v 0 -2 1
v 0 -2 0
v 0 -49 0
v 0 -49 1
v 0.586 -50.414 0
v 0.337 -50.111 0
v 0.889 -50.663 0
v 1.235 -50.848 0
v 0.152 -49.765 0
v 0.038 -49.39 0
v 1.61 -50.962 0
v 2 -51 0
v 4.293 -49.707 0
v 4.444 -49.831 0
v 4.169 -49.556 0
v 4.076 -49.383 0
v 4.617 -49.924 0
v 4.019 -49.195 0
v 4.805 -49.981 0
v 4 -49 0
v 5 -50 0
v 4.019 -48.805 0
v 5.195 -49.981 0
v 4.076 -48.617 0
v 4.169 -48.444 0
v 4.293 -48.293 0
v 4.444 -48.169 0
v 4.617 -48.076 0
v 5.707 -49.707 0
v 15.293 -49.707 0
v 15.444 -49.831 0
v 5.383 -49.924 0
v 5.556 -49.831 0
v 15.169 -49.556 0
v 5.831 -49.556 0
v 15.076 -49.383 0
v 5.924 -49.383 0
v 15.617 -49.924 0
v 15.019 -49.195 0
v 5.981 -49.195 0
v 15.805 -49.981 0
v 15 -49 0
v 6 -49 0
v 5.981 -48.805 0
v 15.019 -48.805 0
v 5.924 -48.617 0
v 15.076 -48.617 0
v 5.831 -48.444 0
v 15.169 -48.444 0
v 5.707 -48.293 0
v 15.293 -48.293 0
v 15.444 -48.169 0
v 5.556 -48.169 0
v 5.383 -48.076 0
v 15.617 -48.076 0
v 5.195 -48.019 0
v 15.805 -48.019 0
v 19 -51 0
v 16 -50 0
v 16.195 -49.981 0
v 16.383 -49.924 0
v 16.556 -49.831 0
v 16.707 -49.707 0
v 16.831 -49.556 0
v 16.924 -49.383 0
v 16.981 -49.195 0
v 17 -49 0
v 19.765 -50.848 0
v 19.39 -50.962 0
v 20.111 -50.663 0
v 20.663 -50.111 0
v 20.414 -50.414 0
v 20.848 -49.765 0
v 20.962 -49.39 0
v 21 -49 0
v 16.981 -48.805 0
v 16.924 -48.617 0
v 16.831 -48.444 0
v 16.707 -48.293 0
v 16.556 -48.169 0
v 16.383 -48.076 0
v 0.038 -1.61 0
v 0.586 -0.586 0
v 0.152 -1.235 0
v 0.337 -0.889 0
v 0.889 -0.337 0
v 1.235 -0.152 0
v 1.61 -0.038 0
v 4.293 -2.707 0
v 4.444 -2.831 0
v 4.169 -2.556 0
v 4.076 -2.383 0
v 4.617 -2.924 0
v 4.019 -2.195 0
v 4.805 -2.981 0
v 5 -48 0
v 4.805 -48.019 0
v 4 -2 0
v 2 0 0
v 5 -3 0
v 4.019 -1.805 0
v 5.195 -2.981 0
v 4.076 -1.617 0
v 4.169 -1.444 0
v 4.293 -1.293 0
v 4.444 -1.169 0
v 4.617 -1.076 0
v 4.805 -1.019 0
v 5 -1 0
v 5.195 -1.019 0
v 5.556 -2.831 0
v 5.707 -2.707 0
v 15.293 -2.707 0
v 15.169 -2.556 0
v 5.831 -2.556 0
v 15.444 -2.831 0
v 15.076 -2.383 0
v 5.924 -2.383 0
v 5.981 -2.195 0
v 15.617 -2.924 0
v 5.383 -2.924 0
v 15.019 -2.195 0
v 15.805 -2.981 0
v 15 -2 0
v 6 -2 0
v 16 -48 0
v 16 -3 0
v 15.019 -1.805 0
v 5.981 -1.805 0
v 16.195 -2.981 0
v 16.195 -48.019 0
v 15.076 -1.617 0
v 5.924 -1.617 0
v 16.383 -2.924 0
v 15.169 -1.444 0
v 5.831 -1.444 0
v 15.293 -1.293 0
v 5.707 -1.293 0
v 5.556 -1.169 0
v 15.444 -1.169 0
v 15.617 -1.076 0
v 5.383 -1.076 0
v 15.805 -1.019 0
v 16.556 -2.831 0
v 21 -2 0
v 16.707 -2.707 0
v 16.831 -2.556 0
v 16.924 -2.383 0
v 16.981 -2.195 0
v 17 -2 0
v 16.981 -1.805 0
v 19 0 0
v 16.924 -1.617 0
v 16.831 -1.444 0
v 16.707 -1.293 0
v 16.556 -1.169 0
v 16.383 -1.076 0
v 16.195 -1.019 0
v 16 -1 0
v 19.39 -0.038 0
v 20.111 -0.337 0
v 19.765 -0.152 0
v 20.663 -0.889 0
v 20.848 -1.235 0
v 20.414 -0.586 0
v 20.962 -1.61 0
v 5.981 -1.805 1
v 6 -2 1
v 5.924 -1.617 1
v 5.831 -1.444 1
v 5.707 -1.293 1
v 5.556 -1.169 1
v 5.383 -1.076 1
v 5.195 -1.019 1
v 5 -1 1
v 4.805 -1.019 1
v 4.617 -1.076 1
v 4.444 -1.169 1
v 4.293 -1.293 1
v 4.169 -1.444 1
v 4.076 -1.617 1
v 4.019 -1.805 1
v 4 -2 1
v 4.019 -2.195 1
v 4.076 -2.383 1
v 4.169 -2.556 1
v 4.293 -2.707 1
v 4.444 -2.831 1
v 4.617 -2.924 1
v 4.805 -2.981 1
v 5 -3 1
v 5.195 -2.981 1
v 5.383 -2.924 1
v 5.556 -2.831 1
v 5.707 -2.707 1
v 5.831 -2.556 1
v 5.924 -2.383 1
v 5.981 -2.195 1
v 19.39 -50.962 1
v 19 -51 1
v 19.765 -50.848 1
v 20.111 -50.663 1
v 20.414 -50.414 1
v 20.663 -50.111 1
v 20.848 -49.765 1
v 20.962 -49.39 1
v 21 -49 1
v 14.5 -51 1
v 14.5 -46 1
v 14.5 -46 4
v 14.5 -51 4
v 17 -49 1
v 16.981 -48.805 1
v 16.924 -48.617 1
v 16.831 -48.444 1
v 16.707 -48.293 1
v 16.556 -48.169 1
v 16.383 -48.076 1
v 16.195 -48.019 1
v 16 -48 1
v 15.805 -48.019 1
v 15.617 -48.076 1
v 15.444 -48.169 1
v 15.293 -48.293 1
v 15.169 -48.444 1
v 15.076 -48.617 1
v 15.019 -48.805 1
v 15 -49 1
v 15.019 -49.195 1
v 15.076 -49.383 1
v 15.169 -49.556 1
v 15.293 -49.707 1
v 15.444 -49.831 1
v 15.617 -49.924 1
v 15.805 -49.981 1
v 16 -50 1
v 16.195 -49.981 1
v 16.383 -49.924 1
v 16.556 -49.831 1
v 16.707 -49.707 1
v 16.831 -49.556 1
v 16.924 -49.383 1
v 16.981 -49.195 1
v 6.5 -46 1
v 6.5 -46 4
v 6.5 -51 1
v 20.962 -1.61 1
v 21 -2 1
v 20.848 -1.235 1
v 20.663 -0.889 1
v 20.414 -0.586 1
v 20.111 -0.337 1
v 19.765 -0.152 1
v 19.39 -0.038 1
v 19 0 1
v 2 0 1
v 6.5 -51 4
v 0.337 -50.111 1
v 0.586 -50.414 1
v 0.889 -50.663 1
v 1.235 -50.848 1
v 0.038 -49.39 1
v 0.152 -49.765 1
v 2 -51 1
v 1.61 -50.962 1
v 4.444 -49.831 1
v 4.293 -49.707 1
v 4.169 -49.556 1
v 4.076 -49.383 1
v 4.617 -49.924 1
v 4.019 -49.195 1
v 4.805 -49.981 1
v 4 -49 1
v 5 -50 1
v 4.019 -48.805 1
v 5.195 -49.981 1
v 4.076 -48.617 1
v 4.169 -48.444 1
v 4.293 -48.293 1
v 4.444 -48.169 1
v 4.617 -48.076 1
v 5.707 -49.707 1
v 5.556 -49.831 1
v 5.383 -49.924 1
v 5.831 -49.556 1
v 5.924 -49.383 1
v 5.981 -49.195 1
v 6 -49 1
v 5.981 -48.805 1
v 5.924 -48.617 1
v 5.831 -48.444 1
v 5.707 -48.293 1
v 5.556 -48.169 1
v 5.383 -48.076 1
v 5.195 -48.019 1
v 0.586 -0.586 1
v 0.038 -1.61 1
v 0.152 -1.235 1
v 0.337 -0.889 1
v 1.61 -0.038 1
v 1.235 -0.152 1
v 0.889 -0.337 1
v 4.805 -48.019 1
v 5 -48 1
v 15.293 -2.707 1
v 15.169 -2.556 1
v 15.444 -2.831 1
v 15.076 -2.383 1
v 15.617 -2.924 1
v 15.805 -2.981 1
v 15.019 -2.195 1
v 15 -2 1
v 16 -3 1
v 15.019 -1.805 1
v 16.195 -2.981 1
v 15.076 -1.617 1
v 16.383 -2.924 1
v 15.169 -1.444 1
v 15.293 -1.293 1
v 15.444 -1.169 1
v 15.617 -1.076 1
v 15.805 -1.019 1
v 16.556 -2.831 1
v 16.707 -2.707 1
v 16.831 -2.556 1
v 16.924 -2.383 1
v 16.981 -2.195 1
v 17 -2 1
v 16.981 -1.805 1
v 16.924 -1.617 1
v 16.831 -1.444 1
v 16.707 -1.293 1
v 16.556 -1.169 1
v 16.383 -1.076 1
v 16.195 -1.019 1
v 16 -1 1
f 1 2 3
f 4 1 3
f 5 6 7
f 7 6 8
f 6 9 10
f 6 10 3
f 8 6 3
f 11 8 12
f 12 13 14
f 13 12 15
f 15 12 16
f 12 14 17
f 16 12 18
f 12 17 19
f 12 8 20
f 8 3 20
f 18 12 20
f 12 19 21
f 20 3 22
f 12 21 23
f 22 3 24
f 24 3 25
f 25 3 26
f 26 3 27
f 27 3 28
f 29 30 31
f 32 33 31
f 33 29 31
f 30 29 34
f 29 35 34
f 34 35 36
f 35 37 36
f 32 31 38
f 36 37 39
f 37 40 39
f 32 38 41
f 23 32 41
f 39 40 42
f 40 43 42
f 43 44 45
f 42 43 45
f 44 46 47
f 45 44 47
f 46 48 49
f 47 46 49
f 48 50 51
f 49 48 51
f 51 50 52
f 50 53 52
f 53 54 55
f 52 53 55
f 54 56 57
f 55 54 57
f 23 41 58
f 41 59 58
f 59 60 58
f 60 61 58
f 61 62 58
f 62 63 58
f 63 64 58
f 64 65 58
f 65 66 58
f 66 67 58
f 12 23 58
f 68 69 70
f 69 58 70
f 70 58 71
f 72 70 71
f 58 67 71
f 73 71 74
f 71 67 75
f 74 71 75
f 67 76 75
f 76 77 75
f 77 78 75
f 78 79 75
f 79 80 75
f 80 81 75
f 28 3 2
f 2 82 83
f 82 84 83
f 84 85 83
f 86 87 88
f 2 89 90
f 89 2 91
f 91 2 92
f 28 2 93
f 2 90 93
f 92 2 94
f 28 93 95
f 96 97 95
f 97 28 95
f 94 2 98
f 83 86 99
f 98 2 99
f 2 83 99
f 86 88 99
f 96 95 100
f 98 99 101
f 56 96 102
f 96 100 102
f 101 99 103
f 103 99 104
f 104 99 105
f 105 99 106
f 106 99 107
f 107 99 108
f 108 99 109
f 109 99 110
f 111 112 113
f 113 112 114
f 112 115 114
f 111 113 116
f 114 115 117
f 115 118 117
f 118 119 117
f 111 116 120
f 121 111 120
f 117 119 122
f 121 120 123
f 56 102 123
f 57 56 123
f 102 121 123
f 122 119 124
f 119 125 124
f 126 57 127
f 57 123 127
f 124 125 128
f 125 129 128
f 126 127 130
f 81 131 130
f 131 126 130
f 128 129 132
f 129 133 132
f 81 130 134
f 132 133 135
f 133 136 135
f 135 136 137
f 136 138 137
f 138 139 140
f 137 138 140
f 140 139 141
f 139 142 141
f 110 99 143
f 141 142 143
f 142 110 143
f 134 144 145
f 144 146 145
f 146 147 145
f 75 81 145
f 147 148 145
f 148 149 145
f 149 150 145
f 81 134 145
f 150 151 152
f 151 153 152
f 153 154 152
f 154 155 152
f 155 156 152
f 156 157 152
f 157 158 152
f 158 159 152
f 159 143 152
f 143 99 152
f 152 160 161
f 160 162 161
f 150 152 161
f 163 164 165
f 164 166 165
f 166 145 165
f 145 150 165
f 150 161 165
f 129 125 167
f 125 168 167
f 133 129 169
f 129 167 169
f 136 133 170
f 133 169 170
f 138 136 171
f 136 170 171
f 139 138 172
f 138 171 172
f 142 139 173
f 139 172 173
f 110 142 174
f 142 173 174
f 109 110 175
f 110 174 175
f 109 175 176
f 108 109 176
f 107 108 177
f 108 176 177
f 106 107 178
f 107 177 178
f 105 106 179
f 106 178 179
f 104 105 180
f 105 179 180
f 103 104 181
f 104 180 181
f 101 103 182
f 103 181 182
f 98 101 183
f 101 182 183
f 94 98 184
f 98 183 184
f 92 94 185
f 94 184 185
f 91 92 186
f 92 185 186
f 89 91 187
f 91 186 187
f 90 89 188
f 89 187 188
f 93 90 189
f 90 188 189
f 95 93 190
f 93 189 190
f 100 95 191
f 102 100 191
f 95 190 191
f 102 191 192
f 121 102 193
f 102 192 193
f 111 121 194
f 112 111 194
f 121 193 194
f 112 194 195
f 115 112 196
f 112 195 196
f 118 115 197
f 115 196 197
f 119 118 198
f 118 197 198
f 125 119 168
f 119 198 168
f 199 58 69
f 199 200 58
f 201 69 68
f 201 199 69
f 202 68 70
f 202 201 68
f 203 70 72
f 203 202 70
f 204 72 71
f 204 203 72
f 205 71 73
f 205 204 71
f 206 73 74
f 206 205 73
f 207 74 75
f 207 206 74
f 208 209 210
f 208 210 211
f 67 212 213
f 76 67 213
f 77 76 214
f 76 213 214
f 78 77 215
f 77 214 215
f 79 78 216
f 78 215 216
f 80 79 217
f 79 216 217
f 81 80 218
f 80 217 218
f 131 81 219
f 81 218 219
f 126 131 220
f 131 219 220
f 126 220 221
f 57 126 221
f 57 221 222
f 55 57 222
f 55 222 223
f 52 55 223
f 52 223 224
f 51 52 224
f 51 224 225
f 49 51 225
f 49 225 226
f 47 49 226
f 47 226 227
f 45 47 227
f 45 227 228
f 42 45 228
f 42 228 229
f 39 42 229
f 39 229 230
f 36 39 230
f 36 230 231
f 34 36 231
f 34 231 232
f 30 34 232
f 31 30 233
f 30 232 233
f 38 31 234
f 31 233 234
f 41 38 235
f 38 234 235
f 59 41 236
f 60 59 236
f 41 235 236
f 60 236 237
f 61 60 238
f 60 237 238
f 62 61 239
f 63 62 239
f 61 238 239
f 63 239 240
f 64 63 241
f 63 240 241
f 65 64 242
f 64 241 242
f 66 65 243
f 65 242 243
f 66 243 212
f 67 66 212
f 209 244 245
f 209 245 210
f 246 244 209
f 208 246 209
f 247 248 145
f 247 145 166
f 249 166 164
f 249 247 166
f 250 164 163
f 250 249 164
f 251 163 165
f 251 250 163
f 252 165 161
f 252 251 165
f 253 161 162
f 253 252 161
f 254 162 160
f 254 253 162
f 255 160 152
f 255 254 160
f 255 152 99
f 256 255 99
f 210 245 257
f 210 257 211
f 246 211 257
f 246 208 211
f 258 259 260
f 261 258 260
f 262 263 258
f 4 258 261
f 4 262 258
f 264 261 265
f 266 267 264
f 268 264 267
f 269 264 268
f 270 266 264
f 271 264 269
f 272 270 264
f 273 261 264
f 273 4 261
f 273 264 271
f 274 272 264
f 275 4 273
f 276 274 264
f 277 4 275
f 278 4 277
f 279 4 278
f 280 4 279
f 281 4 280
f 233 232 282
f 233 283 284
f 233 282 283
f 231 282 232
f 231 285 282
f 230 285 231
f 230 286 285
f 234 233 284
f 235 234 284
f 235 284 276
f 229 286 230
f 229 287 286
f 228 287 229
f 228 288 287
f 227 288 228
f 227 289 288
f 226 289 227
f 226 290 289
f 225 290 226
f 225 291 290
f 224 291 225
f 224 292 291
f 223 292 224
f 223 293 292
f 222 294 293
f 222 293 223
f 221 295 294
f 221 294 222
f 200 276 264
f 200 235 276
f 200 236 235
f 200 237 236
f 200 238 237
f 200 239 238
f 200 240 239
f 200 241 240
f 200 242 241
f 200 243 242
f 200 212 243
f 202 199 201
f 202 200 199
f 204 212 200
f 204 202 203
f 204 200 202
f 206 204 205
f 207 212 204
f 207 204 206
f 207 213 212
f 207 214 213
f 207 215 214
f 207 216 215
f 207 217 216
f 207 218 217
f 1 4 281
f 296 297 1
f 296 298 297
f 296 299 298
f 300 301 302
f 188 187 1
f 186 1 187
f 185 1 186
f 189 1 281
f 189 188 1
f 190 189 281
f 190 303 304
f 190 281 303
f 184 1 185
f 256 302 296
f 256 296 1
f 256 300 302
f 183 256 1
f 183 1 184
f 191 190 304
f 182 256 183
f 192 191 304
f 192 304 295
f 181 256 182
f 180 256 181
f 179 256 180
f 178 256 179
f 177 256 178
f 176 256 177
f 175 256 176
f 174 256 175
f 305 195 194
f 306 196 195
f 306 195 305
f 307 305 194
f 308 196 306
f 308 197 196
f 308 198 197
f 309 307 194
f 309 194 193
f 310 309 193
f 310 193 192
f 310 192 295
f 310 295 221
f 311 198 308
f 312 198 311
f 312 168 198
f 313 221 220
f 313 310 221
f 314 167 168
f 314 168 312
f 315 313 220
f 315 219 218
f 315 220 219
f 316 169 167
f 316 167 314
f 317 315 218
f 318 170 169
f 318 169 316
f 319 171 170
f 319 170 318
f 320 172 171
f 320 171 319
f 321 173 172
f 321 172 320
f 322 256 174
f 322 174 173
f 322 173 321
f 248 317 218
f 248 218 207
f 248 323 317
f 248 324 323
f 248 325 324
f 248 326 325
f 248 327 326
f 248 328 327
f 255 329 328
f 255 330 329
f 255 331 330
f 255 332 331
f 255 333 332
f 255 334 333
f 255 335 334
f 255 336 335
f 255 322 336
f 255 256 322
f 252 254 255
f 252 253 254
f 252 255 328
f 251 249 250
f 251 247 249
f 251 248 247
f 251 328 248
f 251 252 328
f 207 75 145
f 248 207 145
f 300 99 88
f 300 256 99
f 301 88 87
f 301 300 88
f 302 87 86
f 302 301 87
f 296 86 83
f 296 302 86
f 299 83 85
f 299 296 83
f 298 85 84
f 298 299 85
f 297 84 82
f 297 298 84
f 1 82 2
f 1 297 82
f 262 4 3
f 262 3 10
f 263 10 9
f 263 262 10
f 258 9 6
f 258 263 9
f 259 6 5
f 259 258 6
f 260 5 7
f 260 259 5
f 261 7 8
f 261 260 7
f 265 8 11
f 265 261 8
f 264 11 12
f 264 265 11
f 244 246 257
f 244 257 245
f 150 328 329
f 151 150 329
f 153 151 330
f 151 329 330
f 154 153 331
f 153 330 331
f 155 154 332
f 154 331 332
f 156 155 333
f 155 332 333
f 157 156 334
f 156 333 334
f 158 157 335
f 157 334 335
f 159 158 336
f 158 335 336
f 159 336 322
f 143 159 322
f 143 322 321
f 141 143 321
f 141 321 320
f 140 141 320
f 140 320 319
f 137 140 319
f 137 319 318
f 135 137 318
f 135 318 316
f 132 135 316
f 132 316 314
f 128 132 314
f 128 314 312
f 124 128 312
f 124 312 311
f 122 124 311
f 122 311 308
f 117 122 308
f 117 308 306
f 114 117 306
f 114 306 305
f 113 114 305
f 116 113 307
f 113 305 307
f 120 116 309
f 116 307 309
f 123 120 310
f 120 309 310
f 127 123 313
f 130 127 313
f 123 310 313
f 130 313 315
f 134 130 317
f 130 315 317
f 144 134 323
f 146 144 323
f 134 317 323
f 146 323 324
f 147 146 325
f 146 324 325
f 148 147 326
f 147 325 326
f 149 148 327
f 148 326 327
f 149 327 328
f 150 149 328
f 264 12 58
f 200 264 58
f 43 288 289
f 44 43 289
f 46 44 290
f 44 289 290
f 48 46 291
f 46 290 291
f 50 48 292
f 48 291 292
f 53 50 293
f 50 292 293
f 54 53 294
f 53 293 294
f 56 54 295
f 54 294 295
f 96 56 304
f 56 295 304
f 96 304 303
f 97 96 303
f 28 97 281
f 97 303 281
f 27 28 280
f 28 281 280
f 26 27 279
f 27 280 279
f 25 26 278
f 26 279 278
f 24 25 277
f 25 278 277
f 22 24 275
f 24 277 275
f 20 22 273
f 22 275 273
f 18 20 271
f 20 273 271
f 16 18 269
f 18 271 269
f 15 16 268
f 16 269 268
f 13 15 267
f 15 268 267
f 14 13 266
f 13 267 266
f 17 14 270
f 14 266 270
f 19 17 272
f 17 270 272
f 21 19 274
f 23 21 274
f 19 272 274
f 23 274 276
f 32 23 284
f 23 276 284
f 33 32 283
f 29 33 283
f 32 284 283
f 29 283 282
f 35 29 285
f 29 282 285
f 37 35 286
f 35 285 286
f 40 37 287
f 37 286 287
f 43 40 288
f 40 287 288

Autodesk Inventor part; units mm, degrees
ref_plane "YZ Plane" through (0, 0, 0) normal (1, 0, 0) x (0, 1, 0)
ref_plane "XZ Plane" through (0, 0, 0) normal (0, 1, 0) x (-1, 0, 0)
ref_plane "XY Plane" through (0, 0, 0) normal (0, 0, 1) x (1, 0, 0)
sketch "Sketch1" plane through (0, 0, 0) normal (0, 0, 1) x (1, 0, 0)
  line L0 (0, -51) -> (21, -51)
  line L1 (21, -51) -> (21, 0)
  line L2 (21, 0) -> (0, 0)
  line L3 (0, 0) -> (0, -51)
  dimension "d228" = 21
  dimension "d229" = 51
extrude "Extrusion1" add sketch "Sketch1" along normal blind 1
fillet "Fillet1" radius 2 4 edges at (21, 0, 0.5) (0, 0, 0.5) (0, -51, 0.5) (21, -51, 0.5)
sketch "Sketch2" plane through (0, 0, 1) normal (0, 0, 1) x (1, 0, 0)
  circle A0 centre (5, -2) radius 1
  line L0 (0, -2) -> (0, -49) projected
  line L1 (19, 0) -> (2, 0) projected
  line L2 (10.5, 0) -> (10.5, -51)
  line L3 (2, -51) -> (19, -51) projected
  line L4 (0, -25.5) -> (21, -25.5)
  circle A1 centre (16, -2) radius 1
  circle A2 centre (5, -49) radius 1
  line L5 (19, -51) -> (2, -51)
  circle A3 centre (16, -49) radius 1
  point P0 (0, 0)
  point P1 (0, -51)
  dimension "d234" = 2
  dimension "d235" = 5
  dimension "d236" = 2
extrude "Extrusion2" cut sketch "Sketch2" against normal blind 1
sketch "Sketch3" plane through (0, 0, 1) normal (0, 0, 1) x (1, 0, 0)
  line L0 (6.5, -46) -> (14.5, -46)
  line L1 (14.5, -46) -> (14.5, -51)
  line L2 (14.5, -51) -> (6.5, -51)
  line L3 (6.5, -51) -> (6.5, -46)
  line L4 (2, -51) -> (19, -51) projected
  point P0 (0, 0)
  dimension "d242" = 8
  dimension "d243" = 5
  dimension "d244" = 4.5
extrude "Extrusion3" add sketch "Sketch3" along normal blind 3 separate body
properties part number "Langbektang houder"
